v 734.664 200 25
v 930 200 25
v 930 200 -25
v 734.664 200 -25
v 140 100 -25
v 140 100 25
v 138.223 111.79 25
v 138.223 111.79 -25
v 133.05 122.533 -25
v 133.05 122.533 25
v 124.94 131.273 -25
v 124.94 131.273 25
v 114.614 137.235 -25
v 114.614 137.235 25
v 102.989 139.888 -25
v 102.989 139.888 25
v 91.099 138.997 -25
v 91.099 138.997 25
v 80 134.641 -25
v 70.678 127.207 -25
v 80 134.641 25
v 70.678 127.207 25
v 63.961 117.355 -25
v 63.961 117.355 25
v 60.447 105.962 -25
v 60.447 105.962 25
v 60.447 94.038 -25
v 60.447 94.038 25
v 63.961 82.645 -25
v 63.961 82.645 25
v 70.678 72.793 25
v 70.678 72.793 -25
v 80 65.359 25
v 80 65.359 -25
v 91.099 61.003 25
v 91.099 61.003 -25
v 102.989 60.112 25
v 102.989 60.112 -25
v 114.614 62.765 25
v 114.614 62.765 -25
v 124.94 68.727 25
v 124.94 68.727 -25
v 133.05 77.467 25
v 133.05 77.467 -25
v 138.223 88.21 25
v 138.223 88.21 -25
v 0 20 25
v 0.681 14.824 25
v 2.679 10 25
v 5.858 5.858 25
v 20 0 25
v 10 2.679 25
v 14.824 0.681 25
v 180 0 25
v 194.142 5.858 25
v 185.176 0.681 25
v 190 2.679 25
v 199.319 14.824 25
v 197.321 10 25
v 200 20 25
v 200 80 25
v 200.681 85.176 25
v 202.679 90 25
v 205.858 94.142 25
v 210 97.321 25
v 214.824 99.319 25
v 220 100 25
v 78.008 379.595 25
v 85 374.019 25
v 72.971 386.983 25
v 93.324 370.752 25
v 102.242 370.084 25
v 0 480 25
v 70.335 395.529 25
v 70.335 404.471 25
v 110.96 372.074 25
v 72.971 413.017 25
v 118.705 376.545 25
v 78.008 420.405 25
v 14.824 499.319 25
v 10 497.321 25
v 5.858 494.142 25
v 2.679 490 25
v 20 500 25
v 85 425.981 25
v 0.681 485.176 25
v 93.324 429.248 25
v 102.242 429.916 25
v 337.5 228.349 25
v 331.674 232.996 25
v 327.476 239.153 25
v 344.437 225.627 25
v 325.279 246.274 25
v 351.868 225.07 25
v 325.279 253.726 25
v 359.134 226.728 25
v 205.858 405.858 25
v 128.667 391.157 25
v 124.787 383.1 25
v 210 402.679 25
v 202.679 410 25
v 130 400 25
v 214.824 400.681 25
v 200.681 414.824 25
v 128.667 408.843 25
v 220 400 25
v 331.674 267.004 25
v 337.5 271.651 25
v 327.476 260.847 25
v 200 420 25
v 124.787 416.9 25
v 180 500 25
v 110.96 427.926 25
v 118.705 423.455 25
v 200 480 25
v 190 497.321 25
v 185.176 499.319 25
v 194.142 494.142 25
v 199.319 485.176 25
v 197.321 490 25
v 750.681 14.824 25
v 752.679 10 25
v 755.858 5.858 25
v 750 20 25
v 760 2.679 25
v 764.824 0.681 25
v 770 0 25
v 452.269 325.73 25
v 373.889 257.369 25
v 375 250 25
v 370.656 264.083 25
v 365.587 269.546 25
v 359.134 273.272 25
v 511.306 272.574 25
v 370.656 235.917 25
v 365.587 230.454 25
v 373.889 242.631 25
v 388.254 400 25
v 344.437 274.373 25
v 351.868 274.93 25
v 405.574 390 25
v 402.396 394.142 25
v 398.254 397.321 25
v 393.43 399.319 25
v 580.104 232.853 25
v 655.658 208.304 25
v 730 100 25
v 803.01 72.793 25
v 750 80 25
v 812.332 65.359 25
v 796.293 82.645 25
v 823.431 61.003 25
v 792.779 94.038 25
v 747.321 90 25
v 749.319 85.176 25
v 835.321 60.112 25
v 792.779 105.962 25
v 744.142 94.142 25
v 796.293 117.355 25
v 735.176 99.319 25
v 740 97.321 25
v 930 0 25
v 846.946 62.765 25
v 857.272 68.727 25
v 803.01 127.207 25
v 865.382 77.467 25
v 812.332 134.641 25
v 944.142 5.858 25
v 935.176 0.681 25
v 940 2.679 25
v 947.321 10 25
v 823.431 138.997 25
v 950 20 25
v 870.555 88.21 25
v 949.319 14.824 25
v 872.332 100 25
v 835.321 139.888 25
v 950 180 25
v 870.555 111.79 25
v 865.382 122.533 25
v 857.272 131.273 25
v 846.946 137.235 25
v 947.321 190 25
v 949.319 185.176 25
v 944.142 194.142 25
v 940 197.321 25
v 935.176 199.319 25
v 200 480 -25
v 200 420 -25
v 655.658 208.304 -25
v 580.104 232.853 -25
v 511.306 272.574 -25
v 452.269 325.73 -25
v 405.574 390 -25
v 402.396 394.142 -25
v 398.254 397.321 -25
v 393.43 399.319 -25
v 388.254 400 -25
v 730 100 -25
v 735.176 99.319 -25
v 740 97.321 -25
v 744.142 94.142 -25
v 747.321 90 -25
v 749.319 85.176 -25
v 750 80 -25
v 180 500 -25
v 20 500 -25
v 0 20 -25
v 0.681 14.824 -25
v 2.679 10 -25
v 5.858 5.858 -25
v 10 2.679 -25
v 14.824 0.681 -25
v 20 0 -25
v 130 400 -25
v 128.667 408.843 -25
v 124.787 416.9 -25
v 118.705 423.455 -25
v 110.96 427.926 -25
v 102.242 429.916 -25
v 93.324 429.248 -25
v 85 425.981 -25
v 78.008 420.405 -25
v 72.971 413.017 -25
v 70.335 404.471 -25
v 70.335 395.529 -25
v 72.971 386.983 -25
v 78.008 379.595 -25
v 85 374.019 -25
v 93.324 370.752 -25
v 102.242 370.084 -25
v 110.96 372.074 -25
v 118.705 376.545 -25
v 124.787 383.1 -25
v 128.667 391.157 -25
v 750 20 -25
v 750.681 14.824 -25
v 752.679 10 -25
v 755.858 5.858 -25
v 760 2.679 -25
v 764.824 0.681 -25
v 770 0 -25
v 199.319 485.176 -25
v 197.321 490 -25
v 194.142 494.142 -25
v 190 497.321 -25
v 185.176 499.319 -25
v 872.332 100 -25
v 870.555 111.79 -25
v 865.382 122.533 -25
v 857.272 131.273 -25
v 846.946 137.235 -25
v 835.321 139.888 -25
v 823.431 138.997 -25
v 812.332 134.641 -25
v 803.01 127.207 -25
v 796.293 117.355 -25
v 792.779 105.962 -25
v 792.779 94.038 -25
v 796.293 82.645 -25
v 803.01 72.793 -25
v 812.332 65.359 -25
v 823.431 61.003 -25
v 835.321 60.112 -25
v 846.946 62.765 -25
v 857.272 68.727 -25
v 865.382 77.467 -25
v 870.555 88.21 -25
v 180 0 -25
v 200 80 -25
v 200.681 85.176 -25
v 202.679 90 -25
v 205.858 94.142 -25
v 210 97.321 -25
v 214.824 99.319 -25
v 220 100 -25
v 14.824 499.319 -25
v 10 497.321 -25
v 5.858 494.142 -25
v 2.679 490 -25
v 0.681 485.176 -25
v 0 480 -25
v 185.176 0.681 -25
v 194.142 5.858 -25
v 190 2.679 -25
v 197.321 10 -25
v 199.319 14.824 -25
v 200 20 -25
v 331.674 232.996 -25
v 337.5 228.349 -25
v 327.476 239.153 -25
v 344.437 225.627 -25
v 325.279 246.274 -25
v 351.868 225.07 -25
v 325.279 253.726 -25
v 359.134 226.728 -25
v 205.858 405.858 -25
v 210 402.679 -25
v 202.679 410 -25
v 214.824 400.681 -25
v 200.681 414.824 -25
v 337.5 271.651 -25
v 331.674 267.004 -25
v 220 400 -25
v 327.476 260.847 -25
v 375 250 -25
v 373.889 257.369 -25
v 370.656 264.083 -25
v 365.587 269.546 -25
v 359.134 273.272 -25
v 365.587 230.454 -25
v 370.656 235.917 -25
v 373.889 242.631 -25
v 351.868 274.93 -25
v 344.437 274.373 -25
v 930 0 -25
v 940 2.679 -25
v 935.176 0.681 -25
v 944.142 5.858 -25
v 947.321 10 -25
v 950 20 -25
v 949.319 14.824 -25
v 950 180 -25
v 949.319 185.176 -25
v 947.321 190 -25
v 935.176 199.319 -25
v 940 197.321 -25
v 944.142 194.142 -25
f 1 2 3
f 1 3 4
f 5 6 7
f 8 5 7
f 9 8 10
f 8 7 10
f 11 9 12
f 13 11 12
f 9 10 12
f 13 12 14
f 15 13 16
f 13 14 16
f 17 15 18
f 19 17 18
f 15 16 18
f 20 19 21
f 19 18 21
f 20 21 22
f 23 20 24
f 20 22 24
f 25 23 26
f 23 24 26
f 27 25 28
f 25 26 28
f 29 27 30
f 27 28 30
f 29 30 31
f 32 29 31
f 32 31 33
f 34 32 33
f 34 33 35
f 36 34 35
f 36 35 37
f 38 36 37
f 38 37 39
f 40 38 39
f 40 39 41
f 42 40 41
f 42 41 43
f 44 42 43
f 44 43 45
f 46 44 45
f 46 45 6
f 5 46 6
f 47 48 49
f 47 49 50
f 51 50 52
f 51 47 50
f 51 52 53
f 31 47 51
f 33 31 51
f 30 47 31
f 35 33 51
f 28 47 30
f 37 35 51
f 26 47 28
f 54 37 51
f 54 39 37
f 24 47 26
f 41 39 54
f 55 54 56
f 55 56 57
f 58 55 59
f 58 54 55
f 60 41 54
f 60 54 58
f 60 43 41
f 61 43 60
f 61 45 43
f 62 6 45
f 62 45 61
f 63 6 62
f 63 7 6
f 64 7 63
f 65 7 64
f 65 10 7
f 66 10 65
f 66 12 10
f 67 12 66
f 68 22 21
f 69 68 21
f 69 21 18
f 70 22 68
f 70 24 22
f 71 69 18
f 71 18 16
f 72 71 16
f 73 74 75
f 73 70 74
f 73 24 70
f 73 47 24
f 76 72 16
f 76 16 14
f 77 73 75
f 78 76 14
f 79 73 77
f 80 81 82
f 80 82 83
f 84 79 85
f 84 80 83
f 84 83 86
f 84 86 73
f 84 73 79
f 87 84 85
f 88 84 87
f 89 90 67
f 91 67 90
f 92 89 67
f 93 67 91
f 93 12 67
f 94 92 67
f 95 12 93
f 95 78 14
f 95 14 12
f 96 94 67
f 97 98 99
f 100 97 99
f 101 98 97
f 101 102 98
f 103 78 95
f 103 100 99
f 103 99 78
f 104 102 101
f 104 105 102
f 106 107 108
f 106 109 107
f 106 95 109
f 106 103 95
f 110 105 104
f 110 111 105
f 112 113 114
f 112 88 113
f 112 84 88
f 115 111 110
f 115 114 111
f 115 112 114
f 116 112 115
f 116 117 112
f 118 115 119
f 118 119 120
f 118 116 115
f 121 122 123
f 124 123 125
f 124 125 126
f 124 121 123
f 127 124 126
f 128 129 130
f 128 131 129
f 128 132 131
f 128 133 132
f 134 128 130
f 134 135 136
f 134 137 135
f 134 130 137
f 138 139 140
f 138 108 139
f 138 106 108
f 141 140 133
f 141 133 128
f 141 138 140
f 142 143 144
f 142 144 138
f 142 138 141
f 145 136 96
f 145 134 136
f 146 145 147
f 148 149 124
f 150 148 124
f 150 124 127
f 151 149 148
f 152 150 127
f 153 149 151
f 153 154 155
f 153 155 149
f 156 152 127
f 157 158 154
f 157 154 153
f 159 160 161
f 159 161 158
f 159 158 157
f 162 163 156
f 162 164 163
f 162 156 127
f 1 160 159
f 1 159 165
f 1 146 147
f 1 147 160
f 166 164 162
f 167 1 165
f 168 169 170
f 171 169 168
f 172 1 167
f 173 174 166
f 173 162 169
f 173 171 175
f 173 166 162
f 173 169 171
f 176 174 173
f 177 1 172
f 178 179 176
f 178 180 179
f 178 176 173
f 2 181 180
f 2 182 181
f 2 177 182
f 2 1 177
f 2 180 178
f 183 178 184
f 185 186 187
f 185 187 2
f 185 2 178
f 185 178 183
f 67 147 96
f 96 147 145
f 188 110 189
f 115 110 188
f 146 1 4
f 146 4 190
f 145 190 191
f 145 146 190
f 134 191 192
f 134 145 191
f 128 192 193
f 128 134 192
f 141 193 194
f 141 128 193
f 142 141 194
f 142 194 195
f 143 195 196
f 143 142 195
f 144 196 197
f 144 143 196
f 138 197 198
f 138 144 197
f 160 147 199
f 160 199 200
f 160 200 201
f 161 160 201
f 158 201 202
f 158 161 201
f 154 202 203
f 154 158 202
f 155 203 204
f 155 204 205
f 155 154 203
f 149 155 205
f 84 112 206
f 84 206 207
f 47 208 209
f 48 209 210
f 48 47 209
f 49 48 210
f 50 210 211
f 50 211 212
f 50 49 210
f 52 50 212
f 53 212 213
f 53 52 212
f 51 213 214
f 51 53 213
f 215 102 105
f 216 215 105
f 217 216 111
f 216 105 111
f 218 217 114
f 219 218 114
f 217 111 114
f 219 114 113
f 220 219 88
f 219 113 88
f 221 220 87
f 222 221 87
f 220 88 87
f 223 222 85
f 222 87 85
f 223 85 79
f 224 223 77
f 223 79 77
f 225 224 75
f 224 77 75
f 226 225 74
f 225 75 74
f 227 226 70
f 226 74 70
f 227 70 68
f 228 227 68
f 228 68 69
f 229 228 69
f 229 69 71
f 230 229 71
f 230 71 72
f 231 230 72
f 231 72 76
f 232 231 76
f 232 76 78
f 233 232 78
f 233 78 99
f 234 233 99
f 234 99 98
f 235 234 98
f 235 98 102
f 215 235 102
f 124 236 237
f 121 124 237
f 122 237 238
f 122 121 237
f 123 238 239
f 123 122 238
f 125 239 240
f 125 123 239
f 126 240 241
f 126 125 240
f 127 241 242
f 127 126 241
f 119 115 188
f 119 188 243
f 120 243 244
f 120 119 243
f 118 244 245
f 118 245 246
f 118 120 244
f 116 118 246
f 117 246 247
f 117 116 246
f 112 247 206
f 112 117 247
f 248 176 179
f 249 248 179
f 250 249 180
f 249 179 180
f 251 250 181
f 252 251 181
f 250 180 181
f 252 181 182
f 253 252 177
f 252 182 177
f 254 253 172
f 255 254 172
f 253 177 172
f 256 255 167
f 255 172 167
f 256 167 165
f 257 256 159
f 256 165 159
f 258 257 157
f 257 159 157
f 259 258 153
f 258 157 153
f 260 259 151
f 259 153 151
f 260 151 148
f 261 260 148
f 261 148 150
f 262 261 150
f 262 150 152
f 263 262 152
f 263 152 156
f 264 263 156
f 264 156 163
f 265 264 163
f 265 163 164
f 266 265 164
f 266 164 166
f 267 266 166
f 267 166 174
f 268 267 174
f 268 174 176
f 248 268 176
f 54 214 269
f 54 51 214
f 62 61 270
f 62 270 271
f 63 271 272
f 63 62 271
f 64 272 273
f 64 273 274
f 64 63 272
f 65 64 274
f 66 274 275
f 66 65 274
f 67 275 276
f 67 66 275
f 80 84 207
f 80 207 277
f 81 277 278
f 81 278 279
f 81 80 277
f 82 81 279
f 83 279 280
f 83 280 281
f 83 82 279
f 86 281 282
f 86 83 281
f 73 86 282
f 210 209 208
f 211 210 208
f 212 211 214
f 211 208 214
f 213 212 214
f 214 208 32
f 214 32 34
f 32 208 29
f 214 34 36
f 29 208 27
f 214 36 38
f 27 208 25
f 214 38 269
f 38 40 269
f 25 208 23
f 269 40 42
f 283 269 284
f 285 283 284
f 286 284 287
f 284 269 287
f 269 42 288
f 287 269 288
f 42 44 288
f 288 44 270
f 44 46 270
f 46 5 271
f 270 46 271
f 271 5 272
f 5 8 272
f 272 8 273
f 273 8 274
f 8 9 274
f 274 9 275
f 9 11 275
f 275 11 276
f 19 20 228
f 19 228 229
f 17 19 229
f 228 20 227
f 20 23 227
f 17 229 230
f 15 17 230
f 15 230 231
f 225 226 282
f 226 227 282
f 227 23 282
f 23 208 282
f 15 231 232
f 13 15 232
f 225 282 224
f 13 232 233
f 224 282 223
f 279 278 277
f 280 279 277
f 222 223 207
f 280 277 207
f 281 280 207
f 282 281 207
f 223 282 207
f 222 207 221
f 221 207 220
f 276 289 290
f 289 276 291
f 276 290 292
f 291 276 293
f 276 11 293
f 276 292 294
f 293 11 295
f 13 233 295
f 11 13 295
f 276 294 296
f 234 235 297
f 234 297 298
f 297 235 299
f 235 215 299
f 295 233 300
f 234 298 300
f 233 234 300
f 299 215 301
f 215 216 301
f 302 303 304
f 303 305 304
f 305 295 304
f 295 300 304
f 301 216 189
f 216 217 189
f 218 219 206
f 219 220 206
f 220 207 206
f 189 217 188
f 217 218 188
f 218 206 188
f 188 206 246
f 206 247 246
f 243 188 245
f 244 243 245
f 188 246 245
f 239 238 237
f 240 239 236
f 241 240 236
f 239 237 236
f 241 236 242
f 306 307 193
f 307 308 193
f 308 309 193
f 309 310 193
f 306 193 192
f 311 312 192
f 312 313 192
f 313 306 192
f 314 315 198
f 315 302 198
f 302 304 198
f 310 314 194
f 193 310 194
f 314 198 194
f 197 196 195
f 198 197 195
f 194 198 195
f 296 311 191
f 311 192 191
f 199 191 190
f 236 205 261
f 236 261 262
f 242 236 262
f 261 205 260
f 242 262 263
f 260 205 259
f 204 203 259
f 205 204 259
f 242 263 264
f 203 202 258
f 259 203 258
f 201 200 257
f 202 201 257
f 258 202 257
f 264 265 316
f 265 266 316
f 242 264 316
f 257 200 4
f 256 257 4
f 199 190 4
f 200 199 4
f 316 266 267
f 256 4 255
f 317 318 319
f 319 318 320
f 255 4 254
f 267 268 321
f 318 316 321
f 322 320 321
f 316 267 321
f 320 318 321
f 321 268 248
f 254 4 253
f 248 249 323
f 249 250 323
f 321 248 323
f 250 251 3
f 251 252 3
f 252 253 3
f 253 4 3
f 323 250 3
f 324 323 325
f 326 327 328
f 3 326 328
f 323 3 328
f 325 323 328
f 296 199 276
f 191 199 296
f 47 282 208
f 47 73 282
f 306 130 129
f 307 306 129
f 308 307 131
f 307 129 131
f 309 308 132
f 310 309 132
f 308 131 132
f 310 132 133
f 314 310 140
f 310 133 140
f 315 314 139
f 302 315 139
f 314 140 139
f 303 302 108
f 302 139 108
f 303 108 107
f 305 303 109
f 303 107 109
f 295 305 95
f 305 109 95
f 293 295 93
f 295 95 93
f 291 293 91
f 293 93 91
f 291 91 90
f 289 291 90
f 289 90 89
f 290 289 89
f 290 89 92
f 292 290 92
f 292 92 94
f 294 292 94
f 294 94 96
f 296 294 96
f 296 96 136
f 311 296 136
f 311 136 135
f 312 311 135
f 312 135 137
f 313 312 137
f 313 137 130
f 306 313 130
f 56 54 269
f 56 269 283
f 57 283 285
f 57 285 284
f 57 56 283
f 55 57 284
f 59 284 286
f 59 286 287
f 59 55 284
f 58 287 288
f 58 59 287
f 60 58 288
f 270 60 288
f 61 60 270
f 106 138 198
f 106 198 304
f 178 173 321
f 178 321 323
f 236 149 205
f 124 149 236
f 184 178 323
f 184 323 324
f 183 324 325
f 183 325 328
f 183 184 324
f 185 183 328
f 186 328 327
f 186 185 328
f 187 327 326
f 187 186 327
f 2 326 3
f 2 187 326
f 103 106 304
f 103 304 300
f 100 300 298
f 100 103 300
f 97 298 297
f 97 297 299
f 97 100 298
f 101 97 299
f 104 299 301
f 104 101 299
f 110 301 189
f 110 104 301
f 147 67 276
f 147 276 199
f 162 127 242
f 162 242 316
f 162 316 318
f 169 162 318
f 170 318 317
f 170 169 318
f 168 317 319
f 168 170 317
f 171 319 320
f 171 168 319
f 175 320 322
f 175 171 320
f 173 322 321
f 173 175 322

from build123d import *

# Parameters (mm, degrees)
BOSS_EXTRUDE4_DEPTH = 25
SKETCH8_R           = 30
SKETCH8_R_2         = 40
SKETCH8_R_3         = 25
CUT_EXTRUDE2_DEPTH  = 51


with BuildPart() as part:
    # Sketch6 → Boss-Extrude4 (new body, symmetric)
    with BuildSketch(Plane.XY):
        with BuildLine():
            Line((20, 0), (180, 0))
            ThreePointArc((180, 0), (194.142135624, 5.857864376), (200, 20))
            Line((200, 20), (200, 80))
            ThreePointArc((200, 80), (205.857864376, 94.142135624), (220, 100))
            Line((220, 100), (730, 100))
            ThreePointArc((730, 100), (744.142135624, 94.142135624), (750, 80))
            Line((750, 80), (750, 20))
            ThreePointArc((750, 20), (755.857864376, 5.857864376), (770, 0))
            Line((770, 0), (930, 0))
            ThreePointArc((930, 0), (944.142135624, 5.857864376), (950, 20))
            Line((950, 20), (950, 180))
            ThreePointArc((950, 180), (944.142135624, 194.142135624), (930, 200))
            Line((930, 200), (734.664010614, 200))
            ThreePointArc((734.664010614, 200), (544.664010614, 250.910346562), (405.574357176, 390))
            ThreePointArc((405.574357176, 390), (398.2538491, 397.320508076), (388.2538491, 400))
            Line((388.2538491, 400), (220, 400))
            ThreePointArc((220, 400), (205.857864376, 405.857864376), (200, 420))
            Line((200, 420), (200, 480))
            ThreePointArc((200, 480), (194.142135624, 494.142135624), (180, 500))
            Line((180, 500), (20, 500))
            ThreePointArc((20, 500), (5.857864376, 494.142135624), (0, 480))
            Line((0, 480), (0, 20))
            ThreePointArc((0, 20), (5.857864376, 5.857864376), (20, 0))
        make_face()
    extrude(amount=BOSS_EXTRUDE4_DEPTH, both=True)

    # Sketch8 → Cut-Extrude2 (cut, through all)
    with BuildSketch(Plane.XY.offset(25)):
        with Locations((100, 400)):
            Circle(SKETCH8_R)
        with Locations((100, 100)):
            Circle(SKETCH8_R_2)
        with Locations((350, 250)):
            Circle(SKETCH8_R_3)
        with Locations((832.332005307, 100)):
            Circle(SKETCH8_R_2)
    extrude(amount=-CUT_EXTRUDE2_DEPTH, mode=Mode.SUBTRACT)


solid = part.part
